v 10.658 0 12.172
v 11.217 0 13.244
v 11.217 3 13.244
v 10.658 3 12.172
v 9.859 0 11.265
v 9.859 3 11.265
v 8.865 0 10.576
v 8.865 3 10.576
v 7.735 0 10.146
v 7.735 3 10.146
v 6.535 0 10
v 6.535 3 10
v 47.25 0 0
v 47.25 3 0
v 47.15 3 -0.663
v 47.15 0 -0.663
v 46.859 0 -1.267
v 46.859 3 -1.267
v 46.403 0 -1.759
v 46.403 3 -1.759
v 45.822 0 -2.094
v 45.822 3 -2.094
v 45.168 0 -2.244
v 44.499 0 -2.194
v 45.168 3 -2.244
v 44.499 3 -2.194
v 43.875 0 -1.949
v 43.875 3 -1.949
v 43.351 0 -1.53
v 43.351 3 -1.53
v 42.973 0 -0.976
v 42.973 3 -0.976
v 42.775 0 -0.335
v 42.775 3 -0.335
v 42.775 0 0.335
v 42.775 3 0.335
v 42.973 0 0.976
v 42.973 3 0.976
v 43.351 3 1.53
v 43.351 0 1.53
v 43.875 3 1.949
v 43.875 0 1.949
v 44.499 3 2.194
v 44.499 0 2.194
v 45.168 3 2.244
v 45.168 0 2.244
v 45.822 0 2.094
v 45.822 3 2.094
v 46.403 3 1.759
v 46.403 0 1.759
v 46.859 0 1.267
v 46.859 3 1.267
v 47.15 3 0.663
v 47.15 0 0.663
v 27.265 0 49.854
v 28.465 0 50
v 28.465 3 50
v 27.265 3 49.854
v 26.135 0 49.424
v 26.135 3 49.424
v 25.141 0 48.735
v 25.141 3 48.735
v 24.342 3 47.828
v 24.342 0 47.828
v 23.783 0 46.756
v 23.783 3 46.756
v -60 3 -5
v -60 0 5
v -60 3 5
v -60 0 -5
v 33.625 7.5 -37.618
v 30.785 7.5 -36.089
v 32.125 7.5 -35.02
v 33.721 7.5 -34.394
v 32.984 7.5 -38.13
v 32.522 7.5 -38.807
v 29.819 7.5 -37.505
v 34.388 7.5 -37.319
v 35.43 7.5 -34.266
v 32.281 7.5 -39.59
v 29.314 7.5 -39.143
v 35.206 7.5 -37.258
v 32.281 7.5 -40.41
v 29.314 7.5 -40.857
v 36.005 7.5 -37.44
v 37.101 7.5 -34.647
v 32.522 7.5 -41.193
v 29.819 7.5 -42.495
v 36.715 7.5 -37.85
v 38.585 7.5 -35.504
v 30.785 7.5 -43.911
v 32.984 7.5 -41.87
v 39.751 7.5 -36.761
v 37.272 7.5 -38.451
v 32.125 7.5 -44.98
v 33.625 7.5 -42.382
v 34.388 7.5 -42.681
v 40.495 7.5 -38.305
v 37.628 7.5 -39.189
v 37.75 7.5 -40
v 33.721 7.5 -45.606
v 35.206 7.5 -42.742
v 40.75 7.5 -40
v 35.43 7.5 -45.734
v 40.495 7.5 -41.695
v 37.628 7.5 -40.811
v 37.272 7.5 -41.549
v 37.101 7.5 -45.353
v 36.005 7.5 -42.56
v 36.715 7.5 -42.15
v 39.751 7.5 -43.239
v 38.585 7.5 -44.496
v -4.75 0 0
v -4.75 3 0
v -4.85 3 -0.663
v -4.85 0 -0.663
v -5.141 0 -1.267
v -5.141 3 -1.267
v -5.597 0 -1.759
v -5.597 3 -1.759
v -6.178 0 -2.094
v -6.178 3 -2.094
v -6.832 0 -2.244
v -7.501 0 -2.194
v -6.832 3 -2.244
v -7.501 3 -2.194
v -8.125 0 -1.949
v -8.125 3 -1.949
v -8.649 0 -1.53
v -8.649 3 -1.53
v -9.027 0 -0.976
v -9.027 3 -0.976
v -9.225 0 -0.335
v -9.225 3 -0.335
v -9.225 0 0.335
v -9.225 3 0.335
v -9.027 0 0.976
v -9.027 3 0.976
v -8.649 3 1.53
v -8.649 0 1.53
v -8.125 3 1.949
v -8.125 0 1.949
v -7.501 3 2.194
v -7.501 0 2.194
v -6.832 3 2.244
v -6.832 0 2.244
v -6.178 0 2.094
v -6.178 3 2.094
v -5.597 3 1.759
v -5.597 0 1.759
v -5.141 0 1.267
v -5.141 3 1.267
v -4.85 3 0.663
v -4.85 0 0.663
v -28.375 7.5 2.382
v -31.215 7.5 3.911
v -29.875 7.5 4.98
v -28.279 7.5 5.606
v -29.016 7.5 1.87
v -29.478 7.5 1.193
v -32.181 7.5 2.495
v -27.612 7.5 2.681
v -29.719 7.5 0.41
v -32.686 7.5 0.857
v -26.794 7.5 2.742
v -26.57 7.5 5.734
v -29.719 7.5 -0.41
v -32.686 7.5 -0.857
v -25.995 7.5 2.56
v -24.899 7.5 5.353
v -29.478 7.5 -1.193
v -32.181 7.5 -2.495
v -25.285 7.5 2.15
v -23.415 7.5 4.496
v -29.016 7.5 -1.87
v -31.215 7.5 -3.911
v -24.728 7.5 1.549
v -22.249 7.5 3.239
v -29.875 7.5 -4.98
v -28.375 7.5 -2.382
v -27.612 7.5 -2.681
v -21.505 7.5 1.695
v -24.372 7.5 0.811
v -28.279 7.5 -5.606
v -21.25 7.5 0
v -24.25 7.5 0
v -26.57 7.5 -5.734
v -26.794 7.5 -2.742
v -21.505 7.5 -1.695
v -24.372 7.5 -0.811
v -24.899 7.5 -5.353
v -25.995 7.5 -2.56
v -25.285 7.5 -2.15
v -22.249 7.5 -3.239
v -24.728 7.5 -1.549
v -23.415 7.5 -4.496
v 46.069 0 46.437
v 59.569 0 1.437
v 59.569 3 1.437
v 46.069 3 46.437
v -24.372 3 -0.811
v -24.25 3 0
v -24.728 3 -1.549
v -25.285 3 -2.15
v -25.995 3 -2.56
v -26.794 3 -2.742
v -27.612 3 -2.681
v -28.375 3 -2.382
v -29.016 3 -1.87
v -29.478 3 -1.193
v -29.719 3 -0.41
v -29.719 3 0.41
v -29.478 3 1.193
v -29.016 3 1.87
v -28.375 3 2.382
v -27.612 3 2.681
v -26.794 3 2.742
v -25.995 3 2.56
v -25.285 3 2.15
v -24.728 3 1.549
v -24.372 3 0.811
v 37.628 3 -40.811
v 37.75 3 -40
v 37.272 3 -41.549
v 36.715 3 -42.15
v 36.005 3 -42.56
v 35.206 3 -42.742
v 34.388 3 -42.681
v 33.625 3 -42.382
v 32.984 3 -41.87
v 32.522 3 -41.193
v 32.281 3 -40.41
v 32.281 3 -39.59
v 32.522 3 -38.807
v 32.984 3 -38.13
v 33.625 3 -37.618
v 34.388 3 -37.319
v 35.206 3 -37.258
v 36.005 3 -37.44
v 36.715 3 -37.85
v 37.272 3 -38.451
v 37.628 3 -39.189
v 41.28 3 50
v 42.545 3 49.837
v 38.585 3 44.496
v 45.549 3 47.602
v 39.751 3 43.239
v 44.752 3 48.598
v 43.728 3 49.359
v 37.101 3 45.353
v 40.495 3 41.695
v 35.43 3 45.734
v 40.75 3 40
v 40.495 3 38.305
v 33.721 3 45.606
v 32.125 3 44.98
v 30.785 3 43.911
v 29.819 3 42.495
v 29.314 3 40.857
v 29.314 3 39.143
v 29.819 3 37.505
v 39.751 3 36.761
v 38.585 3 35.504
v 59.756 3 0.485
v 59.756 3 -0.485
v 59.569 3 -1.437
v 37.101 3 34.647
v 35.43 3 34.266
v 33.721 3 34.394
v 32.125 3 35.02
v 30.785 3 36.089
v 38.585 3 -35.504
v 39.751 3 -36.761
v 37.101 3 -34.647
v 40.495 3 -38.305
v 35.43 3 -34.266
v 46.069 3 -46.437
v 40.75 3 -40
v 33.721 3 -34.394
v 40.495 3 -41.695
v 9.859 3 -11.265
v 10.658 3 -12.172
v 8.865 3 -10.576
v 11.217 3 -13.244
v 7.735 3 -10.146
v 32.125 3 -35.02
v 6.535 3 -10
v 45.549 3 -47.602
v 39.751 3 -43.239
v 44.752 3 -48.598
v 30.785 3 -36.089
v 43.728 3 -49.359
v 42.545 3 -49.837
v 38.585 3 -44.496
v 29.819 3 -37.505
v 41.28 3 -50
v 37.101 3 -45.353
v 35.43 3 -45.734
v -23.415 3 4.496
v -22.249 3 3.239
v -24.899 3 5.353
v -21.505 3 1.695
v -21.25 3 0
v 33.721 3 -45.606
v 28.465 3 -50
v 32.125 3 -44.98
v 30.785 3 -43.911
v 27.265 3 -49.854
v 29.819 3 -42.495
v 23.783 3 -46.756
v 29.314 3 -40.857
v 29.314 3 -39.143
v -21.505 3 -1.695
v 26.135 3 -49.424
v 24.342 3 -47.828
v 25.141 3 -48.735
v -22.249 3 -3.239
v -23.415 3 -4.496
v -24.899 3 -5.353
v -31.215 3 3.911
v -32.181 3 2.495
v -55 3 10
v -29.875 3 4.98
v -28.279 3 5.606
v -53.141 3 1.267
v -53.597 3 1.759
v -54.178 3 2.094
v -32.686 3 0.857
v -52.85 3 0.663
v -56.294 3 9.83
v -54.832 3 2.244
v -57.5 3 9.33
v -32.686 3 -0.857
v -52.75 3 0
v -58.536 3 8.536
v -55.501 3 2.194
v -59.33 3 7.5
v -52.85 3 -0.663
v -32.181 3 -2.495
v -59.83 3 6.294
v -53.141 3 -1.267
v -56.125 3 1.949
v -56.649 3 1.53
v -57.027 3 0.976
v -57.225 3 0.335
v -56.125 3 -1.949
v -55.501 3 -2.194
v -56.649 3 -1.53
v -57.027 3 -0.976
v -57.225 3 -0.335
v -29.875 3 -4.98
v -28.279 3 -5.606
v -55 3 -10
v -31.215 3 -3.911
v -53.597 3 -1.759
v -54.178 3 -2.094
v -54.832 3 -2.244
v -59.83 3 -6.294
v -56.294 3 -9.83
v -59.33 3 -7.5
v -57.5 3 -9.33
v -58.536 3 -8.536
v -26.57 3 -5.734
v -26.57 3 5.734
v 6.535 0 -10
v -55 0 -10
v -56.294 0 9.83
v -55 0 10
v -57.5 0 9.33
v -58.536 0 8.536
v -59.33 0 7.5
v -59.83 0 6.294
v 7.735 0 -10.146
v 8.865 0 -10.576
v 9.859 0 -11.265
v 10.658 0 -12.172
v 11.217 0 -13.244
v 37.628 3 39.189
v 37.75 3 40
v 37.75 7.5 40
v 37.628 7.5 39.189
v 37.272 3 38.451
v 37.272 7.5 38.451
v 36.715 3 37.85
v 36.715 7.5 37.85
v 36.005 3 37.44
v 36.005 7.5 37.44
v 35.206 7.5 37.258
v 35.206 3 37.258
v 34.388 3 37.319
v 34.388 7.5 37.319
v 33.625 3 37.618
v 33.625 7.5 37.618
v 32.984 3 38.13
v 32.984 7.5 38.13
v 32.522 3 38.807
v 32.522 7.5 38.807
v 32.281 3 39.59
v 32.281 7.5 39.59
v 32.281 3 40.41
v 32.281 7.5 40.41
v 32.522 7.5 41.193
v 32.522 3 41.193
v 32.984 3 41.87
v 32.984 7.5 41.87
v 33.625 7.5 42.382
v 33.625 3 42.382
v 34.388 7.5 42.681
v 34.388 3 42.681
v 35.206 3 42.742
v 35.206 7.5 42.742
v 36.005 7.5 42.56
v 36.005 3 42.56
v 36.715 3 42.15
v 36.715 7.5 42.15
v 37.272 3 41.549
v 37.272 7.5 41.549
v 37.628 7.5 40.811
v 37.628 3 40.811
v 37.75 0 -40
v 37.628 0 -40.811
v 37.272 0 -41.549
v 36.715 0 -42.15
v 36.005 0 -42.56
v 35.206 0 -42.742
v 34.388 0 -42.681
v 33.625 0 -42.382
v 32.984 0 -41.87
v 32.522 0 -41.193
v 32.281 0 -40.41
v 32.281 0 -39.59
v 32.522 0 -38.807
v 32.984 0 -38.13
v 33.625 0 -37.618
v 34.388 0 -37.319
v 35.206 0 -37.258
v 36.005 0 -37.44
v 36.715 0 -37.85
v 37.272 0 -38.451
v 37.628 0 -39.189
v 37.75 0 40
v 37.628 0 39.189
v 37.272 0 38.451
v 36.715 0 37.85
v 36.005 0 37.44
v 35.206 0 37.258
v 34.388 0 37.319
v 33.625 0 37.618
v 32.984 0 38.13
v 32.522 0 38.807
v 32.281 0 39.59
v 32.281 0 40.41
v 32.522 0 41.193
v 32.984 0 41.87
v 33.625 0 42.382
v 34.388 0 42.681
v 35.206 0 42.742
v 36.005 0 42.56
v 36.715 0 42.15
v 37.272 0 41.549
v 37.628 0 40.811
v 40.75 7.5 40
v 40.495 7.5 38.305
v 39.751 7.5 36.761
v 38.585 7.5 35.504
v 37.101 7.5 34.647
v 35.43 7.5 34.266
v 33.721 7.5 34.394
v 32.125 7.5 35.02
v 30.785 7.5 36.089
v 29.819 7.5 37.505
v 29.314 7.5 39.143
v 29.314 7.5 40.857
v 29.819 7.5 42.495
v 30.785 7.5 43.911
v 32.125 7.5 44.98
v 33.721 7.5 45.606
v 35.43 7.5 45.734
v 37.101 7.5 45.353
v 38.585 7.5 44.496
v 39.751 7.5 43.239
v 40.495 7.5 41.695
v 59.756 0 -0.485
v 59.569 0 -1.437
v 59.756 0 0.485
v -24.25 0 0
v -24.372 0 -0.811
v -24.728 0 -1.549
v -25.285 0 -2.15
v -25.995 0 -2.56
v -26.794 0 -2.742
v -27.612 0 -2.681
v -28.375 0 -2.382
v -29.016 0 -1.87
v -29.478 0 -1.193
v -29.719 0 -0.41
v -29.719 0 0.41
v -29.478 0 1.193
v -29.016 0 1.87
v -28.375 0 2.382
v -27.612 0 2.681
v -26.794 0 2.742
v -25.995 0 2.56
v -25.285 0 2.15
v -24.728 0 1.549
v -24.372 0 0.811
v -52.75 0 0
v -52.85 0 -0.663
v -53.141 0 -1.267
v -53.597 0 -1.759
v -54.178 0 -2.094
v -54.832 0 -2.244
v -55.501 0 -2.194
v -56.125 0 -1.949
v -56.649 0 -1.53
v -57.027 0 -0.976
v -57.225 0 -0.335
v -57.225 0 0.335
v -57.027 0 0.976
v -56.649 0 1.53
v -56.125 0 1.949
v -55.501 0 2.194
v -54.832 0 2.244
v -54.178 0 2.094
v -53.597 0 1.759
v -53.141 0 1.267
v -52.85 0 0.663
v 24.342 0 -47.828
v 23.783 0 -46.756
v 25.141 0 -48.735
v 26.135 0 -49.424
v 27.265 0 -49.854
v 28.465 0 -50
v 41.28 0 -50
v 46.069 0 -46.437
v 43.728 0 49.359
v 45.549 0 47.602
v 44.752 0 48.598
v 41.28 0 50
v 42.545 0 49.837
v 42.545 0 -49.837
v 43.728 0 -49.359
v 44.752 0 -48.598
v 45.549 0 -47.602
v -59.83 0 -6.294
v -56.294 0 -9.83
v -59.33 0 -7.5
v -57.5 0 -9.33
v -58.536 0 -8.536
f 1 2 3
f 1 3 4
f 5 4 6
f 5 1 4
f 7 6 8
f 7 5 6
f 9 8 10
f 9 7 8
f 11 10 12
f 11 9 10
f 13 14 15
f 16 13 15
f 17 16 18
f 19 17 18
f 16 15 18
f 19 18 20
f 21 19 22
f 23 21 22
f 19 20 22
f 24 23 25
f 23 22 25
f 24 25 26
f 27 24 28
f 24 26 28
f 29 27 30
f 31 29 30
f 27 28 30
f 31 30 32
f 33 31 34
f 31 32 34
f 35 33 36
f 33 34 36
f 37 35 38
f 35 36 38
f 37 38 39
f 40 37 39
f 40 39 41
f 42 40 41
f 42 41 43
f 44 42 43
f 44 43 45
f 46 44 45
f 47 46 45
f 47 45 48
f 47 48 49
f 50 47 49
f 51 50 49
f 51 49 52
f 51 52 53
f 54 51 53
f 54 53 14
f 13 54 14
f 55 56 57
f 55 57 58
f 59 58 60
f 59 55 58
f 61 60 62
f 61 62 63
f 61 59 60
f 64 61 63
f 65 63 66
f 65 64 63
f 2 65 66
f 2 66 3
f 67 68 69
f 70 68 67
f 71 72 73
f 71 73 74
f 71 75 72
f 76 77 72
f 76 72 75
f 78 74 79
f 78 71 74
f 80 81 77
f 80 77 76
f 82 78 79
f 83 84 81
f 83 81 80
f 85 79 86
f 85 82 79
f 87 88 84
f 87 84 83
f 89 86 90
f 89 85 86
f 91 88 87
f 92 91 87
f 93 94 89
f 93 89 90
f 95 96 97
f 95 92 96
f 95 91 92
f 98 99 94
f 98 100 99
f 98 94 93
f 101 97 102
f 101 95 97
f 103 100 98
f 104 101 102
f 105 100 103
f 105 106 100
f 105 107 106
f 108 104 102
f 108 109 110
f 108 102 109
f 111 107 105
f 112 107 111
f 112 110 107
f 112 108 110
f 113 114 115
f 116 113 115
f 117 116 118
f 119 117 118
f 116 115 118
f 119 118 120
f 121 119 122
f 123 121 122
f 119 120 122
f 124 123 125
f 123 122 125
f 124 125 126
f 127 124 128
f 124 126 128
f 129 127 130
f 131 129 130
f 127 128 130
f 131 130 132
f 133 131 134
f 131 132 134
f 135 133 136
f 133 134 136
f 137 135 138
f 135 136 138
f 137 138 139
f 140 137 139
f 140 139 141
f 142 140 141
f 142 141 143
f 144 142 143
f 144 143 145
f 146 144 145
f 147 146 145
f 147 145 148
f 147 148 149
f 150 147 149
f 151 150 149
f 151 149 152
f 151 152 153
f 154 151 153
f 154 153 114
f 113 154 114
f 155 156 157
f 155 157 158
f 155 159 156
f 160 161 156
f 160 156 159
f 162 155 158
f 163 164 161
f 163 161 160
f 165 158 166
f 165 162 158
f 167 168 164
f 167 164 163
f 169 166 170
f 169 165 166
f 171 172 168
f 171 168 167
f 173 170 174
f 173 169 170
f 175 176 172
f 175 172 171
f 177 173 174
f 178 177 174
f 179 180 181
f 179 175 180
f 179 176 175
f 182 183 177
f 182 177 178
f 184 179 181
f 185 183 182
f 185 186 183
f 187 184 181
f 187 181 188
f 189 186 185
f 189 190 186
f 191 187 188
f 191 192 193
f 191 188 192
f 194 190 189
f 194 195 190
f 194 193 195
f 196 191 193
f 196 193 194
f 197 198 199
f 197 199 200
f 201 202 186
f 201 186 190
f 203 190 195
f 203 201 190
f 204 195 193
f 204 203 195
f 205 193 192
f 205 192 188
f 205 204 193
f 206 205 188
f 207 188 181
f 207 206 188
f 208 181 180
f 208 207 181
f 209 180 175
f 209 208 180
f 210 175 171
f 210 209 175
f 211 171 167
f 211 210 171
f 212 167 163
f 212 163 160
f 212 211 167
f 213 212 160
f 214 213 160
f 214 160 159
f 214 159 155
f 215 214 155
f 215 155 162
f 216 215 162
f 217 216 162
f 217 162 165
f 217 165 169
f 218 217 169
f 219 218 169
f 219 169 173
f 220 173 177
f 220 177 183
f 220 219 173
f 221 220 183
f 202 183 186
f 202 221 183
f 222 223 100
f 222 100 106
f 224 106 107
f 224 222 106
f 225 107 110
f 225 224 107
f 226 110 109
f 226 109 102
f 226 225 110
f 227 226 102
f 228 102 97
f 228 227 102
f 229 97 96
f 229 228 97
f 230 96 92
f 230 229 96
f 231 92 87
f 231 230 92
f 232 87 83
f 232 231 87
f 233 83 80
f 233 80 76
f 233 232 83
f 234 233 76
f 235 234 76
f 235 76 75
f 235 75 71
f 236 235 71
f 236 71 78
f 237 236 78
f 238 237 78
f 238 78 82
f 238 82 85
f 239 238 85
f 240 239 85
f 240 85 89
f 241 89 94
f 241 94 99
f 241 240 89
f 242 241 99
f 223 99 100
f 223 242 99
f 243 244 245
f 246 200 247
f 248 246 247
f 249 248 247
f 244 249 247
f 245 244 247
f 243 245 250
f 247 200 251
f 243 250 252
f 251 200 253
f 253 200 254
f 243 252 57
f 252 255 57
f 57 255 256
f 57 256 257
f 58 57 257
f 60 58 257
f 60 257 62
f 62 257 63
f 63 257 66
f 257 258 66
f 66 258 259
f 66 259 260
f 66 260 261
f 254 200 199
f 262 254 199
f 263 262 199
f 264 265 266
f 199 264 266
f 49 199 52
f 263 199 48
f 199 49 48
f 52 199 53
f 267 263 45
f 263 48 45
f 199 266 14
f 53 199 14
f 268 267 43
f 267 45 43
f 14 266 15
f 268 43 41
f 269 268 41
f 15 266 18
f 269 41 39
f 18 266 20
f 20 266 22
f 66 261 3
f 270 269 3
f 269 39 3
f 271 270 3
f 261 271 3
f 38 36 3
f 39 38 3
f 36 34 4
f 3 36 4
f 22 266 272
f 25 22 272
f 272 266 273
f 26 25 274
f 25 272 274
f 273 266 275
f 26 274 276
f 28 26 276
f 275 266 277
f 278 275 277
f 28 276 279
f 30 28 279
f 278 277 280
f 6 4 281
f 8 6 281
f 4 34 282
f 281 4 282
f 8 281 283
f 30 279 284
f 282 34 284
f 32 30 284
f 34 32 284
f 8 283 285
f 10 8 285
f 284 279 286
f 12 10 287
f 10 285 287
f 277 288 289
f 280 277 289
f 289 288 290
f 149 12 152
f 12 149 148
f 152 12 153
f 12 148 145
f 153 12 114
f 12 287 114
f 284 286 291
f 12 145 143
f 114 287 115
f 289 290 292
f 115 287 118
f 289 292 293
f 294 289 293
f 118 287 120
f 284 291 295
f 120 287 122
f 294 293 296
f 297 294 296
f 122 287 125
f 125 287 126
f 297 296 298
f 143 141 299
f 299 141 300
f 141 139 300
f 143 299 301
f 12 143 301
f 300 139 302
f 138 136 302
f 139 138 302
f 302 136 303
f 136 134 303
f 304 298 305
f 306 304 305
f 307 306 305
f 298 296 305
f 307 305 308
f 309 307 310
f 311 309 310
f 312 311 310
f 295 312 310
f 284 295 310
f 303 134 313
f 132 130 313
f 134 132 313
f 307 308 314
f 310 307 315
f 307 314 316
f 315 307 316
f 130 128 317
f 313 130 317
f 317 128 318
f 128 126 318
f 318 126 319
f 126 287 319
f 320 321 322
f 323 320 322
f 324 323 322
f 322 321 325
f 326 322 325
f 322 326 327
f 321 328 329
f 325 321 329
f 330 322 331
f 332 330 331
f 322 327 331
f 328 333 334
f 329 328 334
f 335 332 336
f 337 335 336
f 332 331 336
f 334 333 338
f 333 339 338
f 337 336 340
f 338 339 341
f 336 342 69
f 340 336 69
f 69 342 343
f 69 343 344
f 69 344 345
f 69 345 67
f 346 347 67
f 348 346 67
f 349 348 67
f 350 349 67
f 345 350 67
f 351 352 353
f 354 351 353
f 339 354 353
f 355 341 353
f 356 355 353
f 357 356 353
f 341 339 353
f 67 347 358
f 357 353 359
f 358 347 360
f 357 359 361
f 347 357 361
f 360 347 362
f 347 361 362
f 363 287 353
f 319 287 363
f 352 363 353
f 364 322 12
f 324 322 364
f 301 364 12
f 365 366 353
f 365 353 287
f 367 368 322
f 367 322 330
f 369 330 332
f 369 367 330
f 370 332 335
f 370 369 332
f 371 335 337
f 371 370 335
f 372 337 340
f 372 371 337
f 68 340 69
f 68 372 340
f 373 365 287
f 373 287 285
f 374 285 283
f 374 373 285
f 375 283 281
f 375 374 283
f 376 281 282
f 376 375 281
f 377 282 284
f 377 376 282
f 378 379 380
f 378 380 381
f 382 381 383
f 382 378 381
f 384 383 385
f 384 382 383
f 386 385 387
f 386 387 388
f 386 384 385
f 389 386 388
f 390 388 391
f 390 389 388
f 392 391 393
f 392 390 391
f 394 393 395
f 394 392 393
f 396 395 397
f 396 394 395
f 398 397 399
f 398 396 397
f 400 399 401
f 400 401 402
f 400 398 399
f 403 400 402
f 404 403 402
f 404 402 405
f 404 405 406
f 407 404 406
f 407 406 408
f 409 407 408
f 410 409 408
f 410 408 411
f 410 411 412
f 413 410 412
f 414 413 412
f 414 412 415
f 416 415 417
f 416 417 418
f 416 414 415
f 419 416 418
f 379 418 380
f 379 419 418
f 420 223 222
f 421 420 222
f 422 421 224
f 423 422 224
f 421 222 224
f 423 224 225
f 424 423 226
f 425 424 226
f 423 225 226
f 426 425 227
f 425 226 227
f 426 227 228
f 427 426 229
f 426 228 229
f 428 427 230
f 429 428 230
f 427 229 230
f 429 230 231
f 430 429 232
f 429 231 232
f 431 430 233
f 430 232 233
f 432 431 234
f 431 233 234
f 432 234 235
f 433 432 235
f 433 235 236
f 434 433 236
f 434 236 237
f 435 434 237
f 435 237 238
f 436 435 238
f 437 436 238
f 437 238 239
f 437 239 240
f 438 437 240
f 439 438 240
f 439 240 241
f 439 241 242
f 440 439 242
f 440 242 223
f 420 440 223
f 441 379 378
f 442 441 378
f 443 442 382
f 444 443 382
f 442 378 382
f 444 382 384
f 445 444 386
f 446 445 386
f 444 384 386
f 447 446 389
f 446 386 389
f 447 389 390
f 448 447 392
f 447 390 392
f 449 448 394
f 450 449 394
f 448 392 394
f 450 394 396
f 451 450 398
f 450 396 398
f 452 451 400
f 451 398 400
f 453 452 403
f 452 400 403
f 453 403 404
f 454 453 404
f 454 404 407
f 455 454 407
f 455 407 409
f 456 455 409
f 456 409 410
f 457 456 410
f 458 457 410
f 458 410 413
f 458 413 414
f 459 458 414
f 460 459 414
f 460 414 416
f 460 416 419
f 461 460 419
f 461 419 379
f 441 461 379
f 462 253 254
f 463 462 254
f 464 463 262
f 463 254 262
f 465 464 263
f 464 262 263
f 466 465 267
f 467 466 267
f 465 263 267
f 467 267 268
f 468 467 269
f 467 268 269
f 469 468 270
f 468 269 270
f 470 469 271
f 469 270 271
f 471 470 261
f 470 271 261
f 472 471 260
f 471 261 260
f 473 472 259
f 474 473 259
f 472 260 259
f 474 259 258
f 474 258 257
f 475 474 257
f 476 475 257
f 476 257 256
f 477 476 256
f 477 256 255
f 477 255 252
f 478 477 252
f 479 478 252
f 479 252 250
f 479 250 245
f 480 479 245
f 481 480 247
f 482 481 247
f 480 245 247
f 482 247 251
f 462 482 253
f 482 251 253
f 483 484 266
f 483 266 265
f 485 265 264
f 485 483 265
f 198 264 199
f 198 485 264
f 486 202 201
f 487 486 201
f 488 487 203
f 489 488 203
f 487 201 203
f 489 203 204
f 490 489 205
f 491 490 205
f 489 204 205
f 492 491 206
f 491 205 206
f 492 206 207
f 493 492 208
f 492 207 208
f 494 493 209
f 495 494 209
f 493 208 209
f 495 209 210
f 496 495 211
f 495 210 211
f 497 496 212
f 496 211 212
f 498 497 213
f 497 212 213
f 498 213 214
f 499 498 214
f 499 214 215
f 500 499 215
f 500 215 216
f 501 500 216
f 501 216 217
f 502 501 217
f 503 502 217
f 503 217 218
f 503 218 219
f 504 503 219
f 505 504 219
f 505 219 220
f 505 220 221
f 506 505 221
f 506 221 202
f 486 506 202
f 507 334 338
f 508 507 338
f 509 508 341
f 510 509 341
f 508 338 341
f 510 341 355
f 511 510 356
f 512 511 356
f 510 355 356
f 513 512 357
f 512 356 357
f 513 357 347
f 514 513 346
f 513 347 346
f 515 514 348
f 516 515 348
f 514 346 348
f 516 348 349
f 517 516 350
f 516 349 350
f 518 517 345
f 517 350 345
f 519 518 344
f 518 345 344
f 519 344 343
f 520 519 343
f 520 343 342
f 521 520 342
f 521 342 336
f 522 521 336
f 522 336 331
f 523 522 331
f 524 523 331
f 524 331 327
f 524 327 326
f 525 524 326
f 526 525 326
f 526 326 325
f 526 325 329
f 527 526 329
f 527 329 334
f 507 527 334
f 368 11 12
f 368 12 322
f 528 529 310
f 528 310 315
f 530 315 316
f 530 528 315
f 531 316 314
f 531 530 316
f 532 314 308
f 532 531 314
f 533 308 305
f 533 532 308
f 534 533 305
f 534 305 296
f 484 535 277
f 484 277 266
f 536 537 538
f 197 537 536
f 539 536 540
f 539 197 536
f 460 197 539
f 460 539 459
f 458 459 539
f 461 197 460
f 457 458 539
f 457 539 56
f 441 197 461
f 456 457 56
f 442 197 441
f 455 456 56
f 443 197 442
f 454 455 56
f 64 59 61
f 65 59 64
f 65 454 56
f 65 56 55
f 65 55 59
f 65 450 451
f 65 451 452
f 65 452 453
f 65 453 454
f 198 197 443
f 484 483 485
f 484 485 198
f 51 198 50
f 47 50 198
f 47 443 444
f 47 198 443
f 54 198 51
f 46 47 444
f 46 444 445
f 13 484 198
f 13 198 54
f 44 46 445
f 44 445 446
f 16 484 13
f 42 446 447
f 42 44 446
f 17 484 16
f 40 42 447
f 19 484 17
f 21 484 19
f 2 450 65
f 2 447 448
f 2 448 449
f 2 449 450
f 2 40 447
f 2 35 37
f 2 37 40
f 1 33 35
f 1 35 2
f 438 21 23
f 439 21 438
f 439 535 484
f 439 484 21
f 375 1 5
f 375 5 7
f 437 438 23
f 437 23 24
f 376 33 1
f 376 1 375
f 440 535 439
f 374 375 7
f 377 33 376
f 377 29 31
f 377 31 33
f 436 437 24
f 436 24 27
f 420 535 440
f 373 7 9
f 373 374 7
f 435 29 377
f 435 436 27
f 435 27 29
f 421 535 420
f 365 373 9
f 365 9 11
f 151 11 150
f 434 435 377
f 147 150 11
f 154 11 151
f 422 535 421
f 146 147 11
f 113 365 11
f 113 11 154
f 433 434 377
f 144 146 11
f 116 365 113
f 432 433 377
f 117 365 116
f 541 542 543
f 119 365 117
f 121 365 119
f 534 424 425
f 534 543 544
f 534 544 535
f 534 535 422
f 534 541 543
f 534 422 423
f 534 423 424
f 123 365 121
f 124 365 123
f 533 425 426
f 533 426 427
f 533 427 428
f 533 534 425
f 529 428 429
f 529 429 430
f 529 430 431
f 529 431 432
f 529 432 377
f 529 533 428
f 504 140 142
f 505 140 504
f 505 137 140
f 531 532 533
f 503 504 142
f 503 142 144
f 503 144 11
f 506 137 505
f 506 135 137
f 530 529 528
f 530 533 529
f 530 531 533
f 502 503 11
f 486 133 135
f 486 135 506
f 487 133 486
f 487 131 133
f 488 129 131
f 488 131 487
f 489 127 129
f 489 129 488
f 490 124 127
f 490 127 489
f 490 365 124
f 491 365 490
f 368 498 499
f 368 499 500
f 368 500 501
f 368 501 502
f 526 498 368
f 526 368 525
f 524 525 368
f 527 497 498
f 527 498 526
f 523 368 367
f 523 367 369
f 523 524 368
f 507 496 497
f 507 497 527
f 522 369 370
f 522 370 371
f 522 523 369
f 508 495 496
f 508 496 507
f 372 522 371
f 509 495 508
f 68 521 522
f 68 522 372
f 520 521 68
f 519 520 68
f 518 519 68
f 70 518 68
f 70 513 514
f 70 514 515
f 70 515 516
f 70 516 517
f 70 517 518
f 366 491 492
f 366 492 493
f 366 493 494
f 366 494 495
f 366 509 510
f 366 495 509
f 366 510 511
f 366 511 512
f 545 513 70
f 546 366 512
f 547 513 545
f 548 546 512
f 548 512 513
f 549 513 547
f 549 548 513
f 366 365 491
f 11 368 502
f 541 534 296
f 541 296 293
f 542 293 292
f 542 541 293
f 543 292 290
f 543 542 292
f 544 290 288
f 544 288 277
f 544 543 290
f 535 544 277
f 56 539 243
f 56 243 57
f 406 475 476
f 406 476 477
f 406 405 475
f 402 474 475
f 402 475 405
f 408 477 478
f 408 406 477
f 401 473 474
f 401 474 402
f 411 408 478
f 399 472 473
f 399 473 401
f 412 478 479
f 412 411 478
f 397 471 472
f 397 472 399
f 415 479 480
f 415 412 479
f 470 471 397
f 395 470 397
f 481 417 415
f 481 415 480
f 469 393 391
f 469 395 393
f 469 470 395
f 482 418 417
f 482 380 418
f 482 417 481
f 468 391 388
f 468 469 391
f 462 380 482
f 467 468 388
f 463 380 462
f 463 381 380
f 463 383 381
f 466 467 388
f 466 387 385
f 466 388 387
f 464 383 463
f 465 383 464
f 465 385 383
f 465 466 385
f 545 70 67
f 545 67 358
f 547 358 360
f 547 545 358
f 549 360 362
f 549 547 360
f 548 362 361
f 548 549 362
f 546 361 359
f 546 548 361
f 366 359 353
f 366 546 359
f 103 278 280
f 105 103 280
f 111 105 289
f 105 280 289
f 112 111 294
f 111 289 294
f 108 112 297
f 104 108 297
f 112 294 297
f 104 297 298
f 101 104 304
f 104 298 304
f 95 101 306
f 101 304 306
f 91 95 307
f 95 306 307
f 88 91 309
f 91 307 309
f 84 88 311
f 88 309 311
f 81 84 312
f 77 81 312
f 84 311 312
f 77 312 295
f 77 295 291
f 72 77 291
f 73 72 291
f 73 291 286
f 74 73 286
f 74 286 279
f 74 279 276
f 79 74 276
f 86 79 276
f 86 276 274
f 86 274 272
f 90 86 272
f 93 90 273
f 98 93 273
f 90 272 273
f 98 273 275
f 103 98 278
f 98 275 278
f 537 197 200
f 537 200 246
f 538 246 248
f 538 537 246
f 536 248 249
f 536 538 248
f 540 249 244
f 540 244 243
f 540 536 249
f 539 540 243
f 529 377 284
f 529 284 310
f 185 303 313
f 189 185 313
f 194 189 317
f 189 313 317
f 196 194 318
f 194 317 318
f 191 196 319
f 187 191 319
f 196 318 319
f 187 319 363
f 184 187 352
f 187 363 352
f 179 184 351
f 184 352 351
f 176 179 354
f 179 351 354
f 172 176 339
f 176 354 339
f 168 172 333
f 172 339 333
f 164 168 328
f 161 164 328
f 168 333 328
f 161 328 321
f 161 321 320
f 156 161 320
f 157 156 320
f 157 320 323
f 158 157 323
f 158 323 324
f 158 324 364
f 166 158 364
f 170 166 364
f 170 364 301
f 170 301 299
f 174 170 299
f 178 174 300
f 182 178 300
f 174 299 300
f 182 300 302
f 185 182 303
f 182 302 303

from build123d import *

# Parameters (mm, degrees)
BOSS_EXTRUDE1_DEPTH = 3
SKETCH2_R           = 2.75
CUT_EXTRUDE1_DEPTH  = 4
SKETCH3_R           = 5.75
SKETCH3_R_2         = 2.75
BOSS_EXTRUDE2_DEPTH = 4.5
SKETCH4_R           = 2.25
CUT_EXTRUDE2_DEPTH  = 4


with BuildPart() as part:
    # Sketch1 → Boss-Extrude1 (new body)
    with BuildSketch(Plane(origin=(0, 0, 0), x_dir=(1, 0, 0), z_dir=(0, 1, 0))):
        with BuildLine():
            Line((-55, 10), (6.534997659, 10))
            ThreePointArc((6.534997659, 10), (9.382971848, 10.890371912), (11.216643547, 13.244382792))
            Line((11.216643547, 13.244382792), (23.783356453, 46.755617208))
            ThreePointArc((23.783356453, 46.755617208), (25.617028152, 49.109628088), (28.465002341, 50))
            Line((28.465002341, 50), (41.279846746, 50))
            ThreePointArc((41.279846746, 50), (44.264499394, 49.011464641), (46.068978172, 46.436739428))
            Line((46.068978172, 46.436739428), (59.568978172, 1.436739428))
            ThreePointArc((59.568978172, 1.436739428), (59.779846746, 0), (59.568978172, -1.436739428))
            Line((59.568978172, -1.436739428), (46.068978172, -46.436739428))
            ThreePointArc((46.068978172, -46.436739428), (44.264499394, -49.011464641), (41.279846746, -50))
            Line((41.279846746, -50), (28.465002341, -50))
            ThreePointArc((28.465002341, -50), (25.617028152, -49.109628088), (23.783356453, -46.755617208))
            Line((23.783356453, -46.755617208), (11.216643547, -13.244382792))
            ThreePointArc((11.216643547, -13.244382792), (9.382971848, -10.890371912), (6.534997659, -10))
            Line((6.534997659, -10), (-55, -10))
            ThreePointArc((-55, -10), (-58.535533906, -8.535533906), (-60, -5))
            Line((-60, -5), (-60, 5))
            ThreePointArc((-60, 5), (-58.535533906, 8.535533906), (-55, 10))
        make_face()
    extrude(amount=BOSS_EXTRUDE1_DEPTH)

    # Sketch2 → Cut-Extrude1 (cut, through all)
    with BuildSketch(Plane(origin=(0, 3, 0), x_dir=(1, 0, 0), z_dir=(0, 1, 0))):
        with Locations((-27, 0)):
            Circle(SKETCH2_R)
        with Locations((35, 40)):
            Circle(SKETCH2_R)
        with Locations((35, -40)):
            Circle(SKETCH2_R)
    extrude(amount=-CUT_EXTRUDE1_DEPTH, mode=Mode.SUBTRACT)

    # Sketch3 → Boss-Extrude2 (add)
    with BuildSketch(Plane(origin=(0, 3, 0), x_dir=(1, 0, 0), z_dir=(0, 1, 0))):
        with Locations((-27, 0)):
            Circle(SKETCH3_R)
        with Locations((-27, 0)):
            Circle(SKETCH3_R_2, mode=Mode.SUBTRACT)
        with Locations((35, 40)):
            Circle(SKETCH3_R)
        with Locations((35, 40)):
            Circle(SKETCH3_R_2, mode=Mode.SUBTRACT)
        with Locations((35, -40)):
            Circle(SKETCH3_R)
        with Locations((35, -40)):
            Circle(SKETCH3_R_2, mode=Mode.SUBTRACT)
    extrude(amount=BOSS_EXTRUDE2_DEPTH)

    # Sketch4 → Cut-Extrude2 (cut, through all)
    with BuildSketch(Plane(origin=(0, 3, 0), x_dir=(1, 0, 0), z_dir=(0, 1, 0))):
        with Locations((-55, 0)):
            Circle(SKETCH4_R)
        with Locations((45, 0)):
            Circle(SKETCH4_R)
        with Locations((-7, 0)):
            Circle(SKETCH4_R)
    extrude(amount=-CUT_EXTRUDE2_DEPTH, mode=Mode.SUBTRACT)


solid = part.part
